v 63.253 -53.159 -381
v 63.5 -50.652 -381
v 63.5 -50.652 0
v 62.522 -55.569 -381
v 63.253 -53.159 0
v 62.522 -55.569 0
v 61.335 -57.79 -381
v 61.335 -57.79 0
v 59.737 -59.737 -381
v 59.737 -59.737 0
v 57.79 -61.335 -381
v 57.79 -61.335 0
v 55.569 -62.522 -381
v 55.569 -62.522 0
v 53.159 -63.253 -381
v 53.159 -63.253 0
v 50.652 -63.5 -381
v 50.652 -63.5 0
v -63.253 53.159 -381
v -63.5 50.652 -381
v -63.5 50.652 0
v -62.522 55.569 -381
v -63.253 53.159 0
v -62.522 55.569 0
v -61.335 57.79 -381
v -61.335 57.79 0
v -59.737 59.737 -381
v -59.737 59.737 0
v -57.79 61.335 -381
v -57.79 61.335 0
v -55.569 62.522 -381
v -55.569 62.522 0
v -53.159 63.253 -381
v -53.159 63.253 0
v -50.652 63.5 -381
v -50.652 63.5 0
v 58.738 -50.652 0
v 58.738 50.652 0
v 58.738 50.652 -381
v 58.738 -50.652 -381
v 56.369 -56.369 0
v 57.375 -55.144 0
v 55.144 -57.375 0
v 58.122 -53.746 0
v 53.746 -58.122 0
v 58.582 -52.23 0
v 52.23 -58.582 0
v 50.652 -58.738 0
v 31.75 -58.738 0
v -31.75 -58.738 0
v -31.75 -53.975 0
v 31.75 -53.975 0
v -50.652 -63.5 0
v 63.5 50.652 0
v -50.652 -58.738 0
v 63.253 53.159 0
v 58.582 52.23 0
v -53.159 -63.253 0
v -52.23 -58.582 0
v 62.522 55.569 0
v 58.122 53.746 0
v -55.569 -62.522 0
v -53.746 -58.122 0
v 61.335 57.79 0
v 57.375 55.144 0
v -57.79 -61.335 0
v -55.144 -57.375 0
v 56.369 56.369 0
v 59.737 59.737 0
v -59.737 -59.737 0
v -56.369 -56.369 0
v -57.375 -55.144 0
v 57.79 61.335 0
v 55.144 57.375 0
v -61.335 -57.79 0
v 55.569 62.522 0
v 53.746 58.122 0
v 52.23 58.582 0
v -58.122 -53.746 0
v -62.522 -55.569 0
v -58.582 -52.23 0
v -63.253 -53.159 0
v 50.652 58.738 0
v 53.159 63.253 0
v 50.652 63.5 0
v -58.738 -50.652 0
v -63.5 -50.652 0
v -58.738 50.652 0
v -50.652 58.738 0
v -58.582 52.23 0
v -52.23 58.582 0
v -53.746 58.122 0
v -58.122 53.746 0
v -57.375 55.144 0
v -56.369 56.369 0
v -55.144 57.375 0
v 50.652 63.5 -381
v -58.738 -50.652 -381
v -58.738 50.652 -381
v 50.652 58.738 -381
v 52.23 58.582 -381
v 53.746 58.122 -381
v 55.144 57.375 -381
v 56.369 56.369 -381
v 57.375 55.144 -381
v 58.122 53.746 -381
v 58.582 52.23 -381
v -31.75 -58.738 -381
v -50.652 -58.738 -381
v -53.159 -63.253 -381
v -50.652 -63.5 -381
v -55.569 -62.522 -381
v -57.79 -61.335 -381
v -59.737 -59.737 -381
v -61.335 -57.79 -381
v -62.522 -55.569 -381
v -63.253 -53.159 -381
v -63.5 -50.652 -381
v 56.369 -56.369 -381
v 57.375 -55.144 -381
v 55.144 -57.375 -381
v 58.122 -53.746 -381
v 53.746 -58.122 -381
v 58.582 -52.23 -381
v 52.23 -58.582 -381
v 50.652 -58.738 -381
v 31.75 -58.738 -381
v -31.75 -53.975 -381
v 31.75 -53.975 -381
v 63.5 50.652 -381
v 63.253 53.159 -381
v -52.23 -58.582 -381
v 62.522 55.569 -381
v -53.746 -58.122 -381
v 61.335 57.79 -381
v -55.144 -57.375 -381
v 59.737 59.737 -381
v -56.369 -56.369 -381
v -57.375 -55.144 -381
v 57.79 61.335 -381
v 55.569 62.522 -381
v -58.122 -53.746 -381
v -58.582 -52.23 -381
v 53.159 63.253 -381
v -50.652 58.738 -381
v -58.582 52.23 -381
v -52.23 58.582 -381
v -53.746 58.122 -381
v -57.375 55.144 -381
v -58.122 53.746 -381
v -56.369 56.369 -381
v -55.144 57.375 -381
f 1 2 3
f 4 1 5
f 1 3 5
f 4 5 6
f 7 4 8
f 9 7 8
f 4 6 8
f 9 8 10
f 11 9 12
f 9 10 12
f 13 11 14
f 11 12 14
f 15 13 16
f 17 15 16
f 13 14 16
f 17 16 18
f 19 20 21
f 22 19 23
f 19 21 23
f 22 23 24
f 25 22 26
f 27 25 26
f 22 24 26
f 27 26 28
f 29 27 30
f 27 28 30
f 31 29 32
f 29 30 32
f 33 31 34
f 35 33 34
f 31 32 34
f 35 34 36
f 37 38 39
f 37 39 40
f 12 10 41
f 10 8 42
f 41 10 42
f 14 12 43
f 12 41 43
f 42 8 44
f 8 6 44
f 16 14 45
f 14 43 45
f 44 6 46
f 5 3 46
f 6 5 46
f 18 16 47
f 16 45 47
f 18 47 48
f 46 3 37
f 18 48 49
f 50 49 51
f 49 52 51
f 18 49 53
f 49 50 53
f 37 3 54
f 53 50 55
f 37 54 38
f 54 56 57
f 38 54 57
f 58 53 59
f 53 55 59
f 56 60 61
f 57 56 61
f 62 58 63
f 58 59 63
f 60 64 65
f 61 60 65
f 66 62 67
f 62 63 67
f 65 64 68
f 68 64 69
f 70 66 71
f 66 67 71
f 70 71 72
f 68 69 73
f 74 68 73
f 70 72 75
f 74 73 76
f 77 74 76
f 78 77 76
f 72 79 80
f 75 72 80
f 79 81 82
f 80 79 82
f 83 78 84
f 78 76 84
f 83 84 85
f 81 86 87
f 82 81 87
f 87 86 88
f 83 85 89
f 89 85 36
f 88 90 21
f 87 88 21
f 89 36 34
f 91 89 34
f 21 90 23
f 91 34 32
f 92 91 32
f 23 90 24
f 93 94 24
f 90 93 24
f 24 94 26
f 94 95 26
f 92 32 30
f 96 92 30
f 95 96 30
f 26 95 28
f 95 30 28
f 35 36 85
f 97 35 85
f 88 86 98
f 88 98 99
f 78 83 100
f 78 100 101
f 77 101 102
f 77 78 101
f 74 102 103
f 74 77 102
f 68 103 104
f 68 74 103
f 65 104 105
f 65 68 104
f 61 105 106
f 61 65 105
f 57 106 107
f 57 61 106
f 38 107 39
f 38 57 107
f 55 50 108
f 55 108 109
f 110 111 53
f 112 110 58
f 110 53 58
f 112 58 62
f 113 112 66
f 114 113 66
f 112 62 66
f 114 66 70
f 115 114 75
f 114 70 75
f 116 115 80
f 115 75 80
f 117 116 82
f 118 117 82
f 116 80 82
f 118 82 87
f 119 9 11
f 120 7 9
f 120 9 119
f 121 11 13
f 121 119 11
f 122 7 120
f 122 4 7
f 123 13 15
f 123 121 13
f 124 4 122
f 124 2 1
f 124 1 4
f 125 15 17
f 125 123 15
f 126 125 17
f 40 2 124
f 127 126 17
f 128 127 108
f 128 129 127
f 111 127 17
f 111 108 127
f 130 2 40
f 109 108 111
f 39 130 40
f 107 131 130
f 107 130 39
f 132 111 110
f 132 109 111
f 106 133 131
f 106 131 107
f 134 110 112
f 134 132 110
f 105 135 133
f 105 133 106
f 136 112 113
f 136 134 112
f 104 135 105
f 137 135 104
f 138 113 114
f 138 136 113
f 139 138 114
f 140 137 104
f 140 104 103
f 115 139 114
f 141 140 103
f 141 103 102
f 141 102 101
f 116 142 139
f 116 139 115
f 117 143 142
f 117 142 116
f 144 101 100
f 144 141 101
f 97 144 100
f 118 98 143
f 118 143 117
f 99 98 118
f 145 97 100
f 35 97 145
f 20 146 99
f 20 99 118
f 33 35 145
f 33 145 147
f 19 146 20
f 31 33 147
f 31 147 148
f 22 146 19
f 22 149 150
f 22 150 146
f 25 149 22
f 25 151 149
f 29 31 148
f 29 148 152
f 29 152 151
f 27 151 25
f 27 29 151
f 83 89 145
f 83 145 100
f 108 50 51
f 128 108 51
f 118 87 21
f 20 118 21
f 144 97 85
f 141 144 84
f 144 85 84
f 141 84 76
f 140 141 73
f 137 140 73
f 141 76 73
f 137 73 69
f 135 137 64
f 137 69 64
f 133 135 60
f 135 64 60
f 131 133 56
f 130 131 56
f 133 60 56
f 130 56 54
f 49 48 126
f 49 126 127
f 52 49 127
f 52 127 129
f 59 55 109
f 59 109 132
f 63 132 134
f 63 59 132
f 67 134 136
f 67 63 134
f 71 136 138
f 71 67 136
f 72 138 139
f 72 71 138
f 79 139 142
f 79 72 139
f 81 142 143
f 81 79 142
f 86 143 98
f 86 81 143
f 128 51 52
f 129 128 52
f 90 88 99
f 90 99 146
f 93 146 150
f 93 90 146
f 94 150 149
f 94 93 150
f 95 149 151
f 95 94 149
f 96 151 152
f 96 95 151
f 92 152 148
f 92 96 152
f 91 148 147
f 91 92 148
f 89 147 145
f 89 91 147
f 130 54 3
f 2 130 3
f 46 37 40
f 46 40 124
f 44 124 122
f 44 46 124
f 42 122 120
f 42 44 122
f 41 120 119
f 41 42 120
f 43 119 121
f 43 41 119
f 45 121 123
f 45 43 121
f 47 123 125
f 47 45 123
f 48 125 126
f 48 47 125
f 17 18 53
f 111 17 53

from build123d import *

# Parameters (mm, degrees)
BOSS_EXTRUDE1_DEPTH = 381
SHELL1_T            = -4.7625
SKETCH3_W           = 63.5
SKETCH3_H           = 4.7625
BOSS_EXTRUDE2_DEPTH = 381


with BuildPart() as part:
    # Sketch1 → Boss-Extrude1 (new body)
    with BuildSketch(Plane.XY):
        with BuildLine():
            Line((-50.652428891, 63.5), (50.652428891, 63.5))
            ThreePointArc((50.652428891, 63.5), (59.737033544, 59.737033544), (63.5, 50.652428891))
            Line((63.5, 50.652428891), (63.5, -50.652428891))
            ThreePointArc((63.5, -50.652428891), (59.737033544, -59.737033544), (50.652428891, -63.5))
            Line((50.652428891, -63.5), (-50.652428891, -63.5))
            ThreePointArc((-50.652428891, -63.5), (-59.737033544, -59.737033544), (-63.5, -50.652428891))
            Line((-63.5, -50.652428891), (-63.5, 50.652428891))
            ThreePointArc((-63.5, 50.652428891), (-59.737033544, 59.737033544), (-50.652428891, 63.5))
        make_face()
    extrude(amount=-BOSS_EXTRUDE1_DEPTH)

    # Shell1
    shell1_openings = [part.faces().sort_by_distance(p)[0] for p in [
        (0, 0, -381),
        (0, 0, 0),
    ]]
    offset(amount=SHELL1_T, openings=shell1_openings, kind=Kind.INTERSECTION)

    # Sketch3 → Boss-Extrude2 (add)
    with BuildSketch(Plane.XY):
        with Locations((0, -56.35625)):
            Rectangle(SKETCH3_W, SKETCH3_H)
    extrude(amount=-BOSS_EXTRUDE2_DEPTH)


solid = part.part
